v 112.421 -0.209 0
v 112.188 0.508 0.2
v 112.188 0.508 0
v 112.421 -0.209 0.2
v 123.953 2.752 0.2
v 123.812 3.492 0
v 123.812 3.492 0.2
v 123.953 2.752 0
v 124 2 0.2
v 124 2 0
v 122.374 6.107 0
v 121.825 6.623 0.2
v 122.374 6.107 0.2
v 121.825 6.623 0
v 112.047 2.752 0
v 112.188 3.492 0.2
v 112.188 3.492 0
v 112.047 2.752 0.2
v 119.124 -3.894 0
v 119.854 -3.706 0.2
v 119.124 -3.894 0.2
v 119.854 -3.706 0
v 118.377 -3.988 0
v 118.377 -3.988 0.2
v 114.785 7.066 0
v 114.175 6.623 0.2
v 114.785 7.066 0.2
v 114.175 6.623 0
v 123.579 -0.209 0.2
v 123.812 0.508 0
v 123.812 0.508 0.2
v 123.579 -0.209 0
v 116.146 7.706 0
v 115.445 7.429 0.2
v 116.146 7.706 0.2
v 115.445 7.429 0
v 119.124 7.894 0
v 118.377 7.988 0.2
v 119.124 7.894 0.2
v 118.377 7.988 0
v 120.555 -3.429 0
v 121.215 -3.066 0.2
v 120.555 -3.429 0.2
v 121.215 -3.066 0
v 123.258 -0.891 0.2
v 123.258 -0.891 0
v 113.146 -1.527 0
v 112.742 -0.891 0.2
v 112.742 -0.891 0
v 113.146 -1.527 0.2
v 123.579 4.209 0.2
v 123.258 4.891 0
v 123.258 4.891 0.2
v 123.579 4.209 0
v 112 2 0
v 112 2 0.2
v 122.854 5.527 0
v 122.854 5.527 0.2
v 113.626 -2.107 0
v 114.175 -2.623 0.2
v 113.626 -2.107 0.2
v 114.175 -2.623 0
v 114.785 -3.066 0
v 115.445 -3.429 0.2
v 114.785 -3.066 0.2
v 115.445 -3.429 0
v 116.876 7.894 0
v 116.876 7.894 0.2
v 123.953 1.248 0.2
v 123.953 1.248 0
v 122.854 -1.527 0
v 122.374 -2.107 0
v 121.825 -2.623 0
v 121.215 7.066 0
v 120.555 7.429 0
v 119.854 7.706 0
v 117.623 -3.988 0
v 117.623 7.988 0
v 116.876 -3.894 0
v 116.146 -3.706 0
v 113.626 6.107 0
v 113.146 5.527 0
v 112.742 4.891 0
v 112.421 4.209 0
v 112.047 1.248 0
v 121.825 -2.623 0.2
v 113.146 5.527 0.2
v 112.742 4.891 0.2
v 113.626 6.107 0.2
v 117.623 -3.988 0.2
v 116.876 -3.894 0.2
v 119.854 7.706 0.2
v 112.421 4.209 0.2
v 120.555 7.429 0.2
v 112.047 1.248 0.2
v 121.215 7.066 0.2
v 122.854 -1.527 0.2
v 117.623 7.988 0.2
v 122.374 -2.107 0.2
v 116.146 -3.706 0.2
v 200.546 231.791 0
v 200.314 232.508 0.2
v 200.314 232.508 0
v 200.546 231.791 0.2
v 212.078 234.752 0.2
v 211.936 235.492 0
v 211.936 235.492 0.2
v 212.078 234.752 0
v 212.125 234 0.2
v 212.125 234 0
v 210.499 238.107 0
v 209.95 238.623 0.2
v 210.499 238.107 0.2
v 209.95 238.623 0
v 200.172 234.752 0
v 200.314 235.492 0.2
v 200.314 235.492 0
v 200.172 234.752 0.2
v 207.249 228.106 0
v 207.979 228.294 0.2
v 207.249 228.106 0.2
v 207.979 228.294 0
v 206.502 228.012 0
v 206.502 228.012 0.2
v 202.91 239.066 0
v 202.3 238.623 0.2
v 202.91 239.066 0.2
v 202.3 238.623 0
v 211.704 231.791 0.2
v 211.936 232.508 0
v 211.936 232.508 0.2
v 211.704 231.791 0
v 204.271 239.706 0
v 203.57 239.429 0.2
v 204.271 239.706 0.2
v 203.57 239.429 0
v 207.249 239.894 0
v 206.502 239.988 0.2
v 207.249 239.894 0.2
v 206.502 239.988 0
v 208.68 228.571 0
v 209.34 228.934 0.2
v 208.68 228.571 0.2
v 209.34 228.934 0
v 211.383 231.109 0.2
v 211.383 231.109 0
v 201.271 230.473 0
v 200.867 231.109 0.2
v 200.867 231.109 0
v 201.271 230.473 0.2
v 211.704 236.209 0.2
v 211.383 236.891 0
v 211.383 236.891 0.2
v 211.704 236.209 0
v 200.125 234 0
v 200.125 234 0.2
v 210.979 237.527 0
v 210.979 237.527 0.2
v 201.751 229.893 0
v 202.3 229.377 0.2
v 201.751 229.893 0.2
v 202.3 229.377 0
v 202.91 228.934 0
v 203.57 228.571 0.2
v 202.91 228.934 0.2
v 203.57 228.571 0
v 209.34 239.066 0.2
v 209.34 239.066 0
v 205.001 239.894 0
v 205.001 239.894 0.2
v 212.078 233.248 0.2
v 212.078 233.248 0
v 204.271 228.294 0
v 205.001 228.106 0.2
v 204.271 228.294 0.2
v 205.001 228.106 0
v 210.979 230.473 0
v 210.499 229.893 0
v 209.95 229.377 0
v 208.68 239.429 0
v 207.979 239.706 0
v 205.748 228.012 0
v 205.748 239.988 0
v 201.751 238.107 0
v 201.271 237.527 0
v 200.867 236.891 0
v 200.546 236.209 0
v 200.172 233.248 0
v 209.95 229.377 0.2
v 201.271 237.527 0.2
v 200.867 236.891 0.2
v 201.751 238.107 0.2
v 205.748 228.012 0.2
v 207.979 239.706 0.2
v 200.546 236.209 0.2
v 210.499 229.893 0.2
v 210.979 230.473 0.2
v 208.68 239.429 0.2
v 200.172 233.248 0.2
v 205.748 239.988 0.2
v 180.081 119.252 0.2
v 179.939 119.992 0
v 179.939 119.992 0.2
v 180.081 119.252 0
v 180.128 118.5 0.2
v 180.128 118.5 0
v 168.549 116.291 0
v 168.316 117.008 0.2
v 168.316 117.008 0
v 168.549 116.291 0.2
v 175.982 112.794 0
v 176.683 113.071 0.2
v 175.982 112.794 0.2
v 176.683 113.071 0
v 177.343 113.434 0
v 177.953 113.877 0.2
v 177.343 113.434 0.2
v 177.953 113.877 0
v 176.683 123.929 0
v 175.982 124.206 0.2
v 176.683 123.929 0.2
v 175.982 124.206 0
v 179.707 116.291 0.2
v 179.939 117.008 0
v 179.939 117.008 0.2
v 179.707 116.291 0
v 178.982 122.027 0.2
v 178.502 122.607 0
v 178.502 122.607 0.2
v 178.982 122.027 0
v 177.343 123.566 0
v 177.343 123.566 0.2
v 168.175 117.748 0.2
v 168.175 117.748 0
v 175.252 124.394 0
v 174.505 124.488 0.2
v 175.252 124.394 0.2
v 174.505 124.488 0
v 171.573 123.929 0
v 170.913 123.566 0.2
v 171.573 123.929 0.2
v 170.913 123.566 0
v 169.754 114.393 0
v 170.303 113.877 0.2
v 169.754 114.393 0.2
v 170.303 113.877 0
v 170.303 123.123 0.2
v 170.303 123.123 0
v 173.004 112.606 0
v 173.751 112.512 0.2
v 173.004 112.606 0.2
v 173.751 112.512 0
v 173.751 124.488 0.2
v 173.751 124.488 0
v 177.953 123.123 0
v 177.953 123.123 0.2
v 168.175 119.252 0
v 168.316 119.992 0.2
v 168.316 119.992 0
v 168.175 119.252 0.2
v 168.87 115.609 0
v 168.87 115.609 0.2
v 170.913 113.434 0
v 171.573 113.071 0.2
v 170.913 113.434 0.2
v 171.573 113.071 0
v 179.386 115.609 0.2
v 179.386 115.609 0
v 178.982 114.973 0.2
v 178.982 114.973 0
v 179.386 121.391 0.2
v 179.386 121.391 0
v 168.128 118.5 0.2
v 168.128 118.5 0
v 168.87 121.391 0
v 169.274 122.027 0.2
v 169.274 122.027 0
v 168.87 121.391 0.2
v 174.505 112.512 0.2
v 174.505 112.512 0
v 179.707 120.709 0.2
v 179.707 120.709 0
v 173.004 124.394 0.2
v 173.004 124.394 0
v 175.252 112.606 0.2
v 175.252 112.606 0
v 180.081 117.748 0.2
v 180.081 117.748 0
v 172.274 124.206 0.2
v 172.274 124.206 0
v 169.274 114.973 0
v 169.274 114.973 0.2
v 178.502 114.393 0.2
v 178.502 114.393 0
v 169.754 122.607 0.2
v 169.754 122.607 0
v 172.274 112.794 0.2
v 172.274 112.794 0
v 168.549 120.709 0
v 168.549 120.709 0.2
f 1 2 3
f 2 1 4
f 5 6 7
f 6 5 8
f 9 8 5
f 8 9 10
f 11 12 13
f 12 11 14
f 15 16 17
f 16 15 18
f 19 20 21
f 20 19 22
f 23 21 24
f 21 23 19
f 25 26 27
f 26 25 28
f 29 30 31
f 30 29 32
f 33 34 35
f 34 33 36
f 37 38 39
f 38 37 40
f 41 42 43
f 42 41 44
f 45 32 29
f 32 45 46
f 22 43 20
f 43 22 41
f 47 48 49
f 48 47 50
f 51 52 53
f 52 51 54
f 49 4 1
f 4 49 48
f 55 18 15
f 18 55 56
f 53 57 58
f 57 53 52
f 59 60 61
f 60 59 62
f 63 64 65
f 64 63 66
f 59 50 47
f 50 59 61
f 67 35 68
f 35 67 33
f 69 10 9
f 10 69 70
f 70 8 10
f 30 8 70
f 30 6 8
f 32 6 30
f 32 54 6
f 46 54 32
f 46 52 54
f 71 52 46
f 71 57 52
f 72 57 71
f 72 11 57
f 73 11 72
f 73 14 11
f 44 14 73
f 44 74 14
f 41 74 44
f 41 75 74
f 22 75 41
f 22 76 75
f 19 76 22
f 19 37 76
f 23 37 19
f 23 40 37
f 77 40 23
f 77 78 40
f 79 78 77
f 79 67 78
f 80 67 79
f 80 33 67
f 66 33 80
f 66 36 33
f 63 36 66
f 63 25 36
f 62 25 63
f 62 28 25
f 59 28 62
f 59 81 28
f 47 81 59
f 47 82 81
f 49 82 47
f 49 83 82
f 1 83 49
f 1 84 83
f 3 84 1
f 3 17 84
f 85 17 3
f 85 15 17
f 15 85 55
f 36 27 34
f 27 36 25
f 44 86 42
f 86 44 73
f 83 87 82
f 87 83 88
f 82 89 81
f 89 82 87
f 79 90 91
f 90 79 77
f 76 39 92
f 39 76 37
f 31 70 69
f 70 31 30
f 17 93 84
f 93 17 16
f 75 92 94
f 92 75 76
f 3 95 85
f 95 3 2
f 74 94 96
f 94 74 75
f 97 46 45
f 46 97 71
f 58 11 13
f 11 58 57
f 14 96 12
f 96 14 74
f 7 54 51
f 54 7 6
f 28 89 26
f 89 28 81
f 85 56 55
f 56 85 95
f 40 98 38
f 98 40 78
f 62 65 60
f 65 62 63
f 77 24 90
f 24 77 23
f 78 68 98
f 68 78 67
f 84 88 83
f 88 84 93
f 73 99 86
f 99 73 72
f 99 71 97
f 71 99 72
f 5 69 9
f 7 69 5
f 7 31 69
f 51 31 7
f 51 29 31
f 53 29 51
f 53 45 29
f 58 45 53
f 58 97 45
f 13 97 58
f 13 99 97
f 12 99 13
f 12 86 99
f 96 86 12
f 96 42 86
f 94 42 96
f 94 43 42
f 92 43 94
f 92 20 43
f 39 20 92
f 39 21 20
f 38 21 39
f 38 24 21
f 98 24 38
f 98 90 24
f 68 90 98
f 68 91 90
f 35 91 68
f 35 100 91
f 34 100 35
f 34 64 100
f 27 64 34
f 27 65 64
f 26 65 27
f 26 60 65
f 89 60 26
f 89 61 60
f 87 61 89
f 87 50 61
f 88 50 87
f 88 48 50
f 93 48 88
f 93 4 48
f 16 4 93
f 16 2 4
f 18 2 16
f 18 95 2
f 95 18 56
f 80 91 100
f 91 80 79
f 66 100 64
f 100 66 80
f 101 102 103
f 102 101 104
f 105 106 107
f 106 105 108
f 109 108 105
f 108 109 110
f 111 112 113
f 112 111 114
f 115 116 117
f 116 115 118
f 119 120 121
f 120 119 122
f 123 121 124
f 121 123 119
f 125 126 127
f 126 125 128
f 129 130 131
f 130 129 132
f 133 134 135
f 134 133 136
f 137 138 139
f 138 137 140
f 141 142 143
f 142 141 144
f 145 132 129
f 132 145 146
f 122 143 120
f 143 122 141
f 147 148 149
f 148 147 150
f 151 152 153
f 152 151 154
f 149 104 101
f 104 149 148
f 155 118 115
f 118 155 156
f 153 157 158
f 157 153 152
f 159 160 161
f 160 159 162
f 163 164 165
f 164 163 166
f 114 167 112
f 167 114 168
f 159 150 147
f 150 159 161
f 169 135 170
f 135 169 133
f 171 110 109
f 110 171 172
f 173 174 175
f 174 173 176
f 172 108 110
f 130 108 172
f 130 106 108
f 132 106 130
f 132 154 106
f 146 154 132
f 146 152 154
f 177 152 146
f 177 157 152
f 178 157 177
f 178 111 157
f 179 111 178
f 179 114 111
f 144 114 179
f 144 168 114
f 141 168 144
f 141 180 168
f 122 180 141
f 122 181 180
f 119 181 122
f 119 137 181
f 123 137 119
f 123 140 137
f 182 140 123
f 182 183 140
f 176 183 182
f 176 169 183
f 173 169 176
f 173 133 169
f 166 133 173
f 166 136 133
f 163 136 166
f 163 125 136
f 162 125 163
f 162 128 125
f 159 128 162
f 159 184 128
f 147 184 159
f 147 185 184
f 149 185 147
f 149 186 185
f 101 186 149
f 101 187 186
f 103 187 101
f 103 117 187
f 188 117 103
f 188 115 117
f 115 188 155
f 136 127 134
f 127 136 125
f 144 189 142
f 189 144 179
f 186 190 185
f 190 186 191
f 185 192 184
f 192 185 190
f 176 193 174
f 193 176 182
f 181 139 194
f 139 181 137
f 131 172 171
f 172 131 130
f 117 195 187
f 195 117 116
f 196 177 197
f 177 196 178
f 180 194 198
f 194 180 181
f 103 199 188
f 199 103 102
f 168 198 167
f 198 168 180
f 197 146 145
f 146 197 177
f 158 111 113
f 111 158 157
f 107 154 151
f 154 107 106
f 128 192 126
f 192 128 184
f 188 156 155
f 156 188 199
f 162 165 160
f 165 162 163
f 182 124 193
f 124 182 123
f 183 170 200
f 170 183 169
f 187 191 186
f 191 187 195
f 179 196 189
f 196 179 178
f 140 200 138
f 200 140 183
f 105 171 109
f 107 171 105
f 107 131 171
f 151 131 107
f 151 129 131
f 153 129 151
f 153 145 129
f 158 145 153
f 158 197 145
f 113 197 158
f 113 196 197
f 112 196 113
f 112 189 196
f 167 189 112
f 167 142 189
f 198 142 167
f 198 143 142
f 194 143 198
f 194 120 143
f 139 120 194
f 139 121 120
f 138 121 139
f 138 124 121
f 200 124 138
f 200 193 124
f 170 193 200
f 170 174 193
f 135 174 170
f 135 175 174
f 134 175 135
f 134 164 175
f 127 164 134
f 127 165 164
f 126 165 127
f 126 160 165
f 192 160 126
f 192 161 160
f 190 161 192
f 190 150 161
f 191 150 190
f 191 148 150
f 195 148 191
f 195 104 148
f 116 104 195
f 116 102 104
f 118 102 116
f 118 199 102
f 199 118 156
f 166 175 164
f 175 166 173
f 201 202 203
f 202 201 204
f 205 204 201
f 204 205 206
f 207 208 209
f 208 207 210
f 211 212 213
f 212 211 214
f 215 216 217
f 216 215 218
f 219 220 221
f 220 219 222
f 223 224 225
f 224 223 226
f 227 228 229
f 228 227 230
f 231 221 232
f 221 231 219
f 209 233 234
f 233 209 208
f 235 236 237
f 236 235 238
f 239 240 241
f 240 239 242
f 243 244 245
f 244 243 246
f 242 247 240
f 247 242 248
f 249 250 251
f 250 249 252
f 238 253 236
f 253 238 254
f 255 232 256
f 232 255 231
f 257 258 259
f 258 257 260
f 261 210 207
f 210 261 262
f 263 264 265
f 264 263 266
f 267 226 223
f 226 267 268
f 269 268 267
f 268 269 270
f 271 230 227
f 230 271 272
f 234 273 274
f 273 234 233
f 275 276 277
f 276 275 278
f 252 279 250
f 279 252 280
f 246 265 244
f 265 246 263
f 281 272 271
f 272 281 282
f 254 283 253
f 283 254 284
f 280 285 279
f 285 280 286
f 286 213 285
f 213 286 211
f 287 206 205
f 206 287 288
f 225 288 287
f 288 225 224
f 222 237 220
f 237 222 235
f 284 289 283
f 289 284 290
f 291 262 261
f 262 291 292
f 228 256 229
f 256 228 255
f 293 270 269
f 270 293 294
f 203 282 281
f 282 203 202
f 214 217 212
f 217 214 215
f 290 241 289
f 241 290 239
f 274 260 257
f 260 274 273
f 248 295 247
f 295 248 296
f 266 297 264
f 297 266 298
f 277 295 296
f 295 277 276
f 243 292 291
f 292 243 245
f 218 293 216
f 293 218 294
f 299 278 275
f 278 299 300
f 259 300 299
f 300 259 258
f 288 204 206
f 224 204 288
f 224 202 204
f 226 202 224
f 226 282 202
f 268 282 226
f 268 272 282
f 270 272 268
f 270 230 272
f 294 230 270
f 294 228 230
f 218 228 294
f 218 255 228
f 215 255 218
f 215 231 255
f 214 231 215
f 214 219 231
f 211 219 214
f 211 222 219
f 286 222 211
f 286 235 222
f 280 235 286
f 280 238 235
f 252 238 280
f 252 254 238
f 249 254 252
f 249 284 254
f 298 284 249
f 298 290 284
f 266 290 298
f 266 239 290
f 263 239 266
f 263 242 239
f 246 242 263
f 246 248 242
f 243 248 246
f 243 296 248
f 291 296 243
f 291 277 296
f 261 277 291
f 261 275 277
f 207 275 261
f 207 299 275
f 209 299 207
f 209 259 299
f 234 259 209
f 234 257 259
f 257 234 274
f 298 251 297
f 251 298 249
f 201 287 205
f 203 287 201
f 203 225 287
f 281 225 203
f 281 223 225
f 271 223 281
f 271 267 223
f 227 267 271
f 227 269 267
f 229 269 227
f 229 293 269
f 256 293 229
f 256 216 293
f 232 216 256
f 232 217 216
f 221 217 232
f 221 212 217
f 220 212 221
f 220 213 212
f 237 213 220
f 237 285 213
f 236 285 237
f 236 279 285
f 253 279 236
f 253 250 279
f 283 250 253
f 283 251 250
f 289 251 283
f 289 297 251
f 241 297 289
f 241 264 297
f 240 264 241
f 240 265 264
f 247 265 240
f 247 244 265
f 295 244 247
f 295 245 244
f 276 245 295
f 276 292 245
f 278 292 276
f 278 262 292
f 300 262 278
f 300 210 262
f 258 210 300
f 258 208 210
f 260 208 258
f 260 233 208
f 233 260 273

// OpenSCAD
union() {
  union() {
    translate([118, 2, 0]) {
      cylinder(h = 0.2, r = 6);
    }
    translate([206.125, 234, 0]) {
      cylinder(h = 0.2, r = 6);
    }
  }
  translate([174.128, 118.5, 0]) {
    cylinder(h = 0.2, r = 6);
  }
}
$fn = 50;
